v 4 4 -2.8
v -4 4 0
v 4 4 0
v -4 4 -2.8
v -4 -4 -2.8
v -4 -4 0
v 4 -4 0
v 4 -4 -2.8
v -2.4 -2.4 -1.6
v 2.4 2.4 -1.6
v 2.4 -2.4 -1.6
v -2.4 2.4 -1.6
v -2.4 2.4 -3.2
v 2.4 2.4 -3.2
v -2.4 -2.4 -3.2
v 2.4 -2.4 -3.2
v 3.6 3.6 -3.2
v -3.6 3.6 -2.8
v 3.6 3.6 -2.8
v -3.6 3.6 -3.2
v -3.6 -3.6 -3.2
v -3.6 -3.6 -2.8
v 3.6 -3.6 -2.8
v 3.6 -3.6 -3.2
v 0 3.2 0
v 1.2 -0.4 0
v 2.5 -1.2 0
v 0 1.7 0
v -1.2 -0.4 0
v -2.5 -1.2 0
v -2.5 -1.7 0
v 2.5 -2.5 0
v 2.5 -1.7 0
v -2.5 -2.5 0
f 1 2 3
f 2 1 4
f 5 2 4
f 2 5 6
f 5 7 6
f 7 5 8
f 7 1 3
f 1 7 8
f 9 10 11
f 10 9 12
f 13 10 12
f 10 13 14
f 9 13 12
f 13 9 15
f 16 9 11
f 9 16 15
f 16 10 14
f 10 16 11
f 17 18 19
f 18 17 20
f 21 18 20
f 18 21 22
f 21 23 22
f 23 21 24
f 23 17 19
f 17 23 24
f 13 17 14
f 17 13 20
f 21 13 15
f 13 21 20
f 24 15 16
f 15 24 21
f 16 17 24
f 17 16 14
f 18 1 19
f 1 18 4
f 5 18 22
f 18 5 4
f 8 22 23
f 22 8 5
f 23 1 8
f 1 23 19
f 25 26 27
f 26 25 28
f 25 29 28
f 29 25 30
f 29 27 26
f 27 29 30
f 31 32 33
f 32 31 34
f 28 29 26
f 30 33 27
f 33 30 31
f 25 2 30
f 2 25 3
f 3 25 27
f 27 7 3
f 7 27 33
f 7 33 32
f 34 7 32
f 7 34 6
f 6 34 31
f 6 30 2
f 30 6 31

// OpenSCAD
// file: ../p/box5.scad
use <../lib.scad>
function ldraw_lib__box5() = [
// 0 Box with 5 Faces and All Edges
// 0 Name: box5.dat
// 0 Author: James Jessiman
// 0 !LDRAW_ORG Primitive UPDATE 2012-01
// 0 !LICENSE Licensed under CC BY 4.0 : see CAreadme.txt
// 
// 0 BFC CERTIFY CCW
  [0,"BFC","CERTIFY"],
  [0,"BFC","CCW"],
// 
// 0 !HISTORY 2002-04-03 [sbliss] Modified for BFC compliance
// 0 !HISTORY 2002-04-25 [PTadmin] Official Update 2002-02
// 0 !HISTORY 2007-06-24 [PTadmin] Header formatted for Contributor Agreement
// 0 !HISTORY 2008-07-01 [PTadmin] Official Update 2008-01
// 0 !HISTORY 2012-02-16 [Philo] Changed to CCW
// 0 !HISTORY 2012-03-30 [PTadmin] Official Update 2012-01
// 
// 
// 2 24 1 1 1 -1 1 1
  [2,24,1,1,1,-1,1,1],
// 2 24 -1 1 1 -1 1 -1
  [2,24,-1,1,1,-1,1,-1],
// 2 24 -1 1 -1 1 1 -1
  [2,24,-1,1,-1,1,1,-1],
// 2 24 1 1 -1 1 1 1
  [2,24,1,1,-1,1,1,1],
// 2 24 1 0 1 -1 0 1
  [2,24,1,0,1,-1,0,1],
// 2 24 -1 0 1 -1 0 -1
  [2,24,-1,0,1,-1,0,-1],
// 2 24 -1 0 -1 1 0 -1
  [2,24,-1,0,-1,1,0,-1],
// 2 24 1 0 -1 1 0 1
  [2,24,1,0,-1,1,0,1],
// 2 24 1 0 1 1 1 1
  [2,24,1,0,1,1,1,1],
// 2 24 -1 0 1 -1 1 1
  [2,24,-1,0,1,-1,1,1],
// 2 24 1 0 -1 1 1 -1
  [2,24,1,0,-1,1,1,-1],
// 2 24 -1 0 -1 -1 1 -1
  [2,24,-1,0,-1,-1,1,-1],
// 4 16 -1 1 1 1 1 1 1 1 -1 -1 1 -1
  [4,16,-1,1,1,1,1,1,1,1,-1,-1,1,-1],
// 4 16 -1 1 1 -1 0 1 1 0 1 1 1 1
  [4,16,-1,1,1,-1,0,1,1,0,1,1,1,1],
// 4 16 -1 1 -1 -1 0 -1 -1 0 1 -1 1 1
  [4,16,-1,1,-1,-1,0,-1,-1,0,1,-1,1,1],
// 4 16 1 1 -1 1 0 -1 -1 0 -1 -1 1 -1
  [4,16,1,1,-1,1,0,-1,-1,0,-1,-1,1,-1],
// 4 16 1 1 1 1 0 1 1 0 -1 1 1 -1
  [4,16,1,1,1,1,0,1,1,0,-1,1,1,-1],
];
module ldraw_lib__box5(step=0, col=false, unit=2/5, alt=false, line=0.2, solid=!$preview)
    makepoly(ldraw_lib__box5(), step=step, col=col, unit=unit, alt=alt, line=line, solid=solid);
ldraw_lib__box5(line=0.2);
// file: ../p/box4.scad
use <../lib.scad>
function ldraw_lib__box4() = [
// 0 Box with 4 Faces (2 Parallel Pairs) and All Edges
// 0 Name: box4.dat
// 0 Author: James Jessiman
// 0 !LDRAW_ORG Primitive UPDATE 2012-01
// 0 !LICENSE Licensed under CC BY 4.0 : see CAreadme.txt
// 
// 0 BFC CERTIFY CCW
  [0,"BFC","CERTIFY"],
  [0,"BFC","CCW"],
// 
// 0 !HISTORY 2002-04-03 [sbliss] Modified for BFC compliance
// 0 !HISTORY 2002-04-25 [PTadmin] Official Update 2002-02
// 0 !HISTORY 2007-06-24 [PTadmin] Header formatted for Contributor Agreement
// 0 !HISTORY 2008-07-01 [PTadmin] Official Update 2008-01
// 0 !HISTORY 2012-02-16 [Philo] Changed to CCW
// 0 !HISTORY 2012-03-30 [PTadmin] Official Update 2012-01
// 
// 
// 2 24 1 1 1 -1 1 1
  [2,24,1,1,1,-1,1,1],
// 2 24 -1 1 1 -1 1 -1
  [2,24,-1,1,1,-1,1,-1],
// 2 24 -1 1 -1 1 1 -1
  [2,24,-1,1,-1,1,1,-1],
// 2 24 1 1 -1 1 1 1
  [2,24,1,1,-1,1,1,1],
// 2 24 1 0 1 -1 0 1
  [2,24,1,0,1,-1,0,1],
// 2 24 -1 0 1 -1 0 -1
  [2,24,-1,0,1,-1,0,-1],
// 2 24 -1 0 -1 1 0 -1
  [2,24,-1,0,-1,1,0,-1],
// 2 24 1 0 -1 1 0 1
  [2,24,1,0,-1,1,0,1],
// 2 24 1 0 1 1 1 1
  [2,24,1,0,1,1,1,1],
// 2 24 -1 0 1 -1 1 1
  [2,24,-1,0,1,-1,1,1],
// 2 24 1 0 -1 1 1 -1
  [2,24,1,0,-1,1,1,-1],
// 2 24 -1 0 -1 -1 1 -1
  [2,24,-1,0,-1,-1,1,-1],
// 4 16 -1 1 1 -1 0 1 1 0 1 1 1 1
  [4,16,-1,1,1,-1,0,1,1,0,1,1,1,1],
// 4 16 -1 1 -1 -1 0 -1 -1 0 1 -1 1 1
  [4,16,-1,1,-1,-1,0,-1,-1,0,1,-1,1,1],
// 4 16 1 1 -1 1 0 -1 -1 0 -1 -1 1 -1
  [4,16,1,1,-1,1,0,-1,-1,0,-1,-1,1,-1],
// 4 16 1 1 1 1 0 1 1 0 -1 1 1 -1
  [4,16,1,1,1,1,0,1,1,0,-1,1,1,-1],
];
module ldraw_lib__box4(step=0, col=false, unit=2/5, alt=false, line=0.2, solid=!$preview)
    makepoly(ldraw_lib__box4(), step=step, col=col, unit=unit, alt=alt, line=line, solid=solid);
ldraw_lib__box4(line=0.2);
// file: s/3070bs01.scad
use <../../lib.scad>
use <../../p/box4.scad>
use <../../p/box5.scad>
function ldraw_lib__s__3070bs01() = [
// 0 ~Tile  1 x  1 with Groove without Top Face
// 0 Name: s\3070bs01.dat
// 0 Author: Chris Dee [cwdee]
// 0 !LDRAW_ORG Subpart UPDATE 2009-02
// 0 !LICENSE Licensed under CC BY 4.0 : see CAreadme.txt
// 
// 0 BFC CERTIFY CCW
  [0,"BFC","CERTIFY"],
  [0,"BFC","CCW"],
// 
// 0 !HISTORY 2009-09-03 [PTadmin] Official Update 2009-02
// 
// 
// 1 16 0 0 0 10 0 0 0 7 0 0 0 10 box4.dat
  [1,16,0,0,0,10,0,0,0,7,0,0,0,10, ldraw_lib__box4()],
// 0 BFC INVERTNEXT
  [0,"BFC","INVERTNEXT"],
// 1 16 0 8 0 6 0 0 0 -4 0 0 0 6 box5.dat
  [1,16,0,8,0,6,0,0,0,-4,0,0,0,6, ldraw_lib__box5()],
// 1 16 0 7 0 9 0 0 0 1 0 0 0 9 box4.dat
  [1,16,0,7,0,9,0,0,0,1,0,0,0,9, ldraw_lib__box4()],
// 
// 4 16 9 8 9 6 8 6 -6 8 6 -9 8 9
  [4,16,9,8,9,6,8,6,-6,8,6,-9,8,9],
// 4 16 -9 8 9 -6 8 6 -6 8 -6 -9 8 -9
  [4,16,-9,8,9,-6,8,6,-6,8,-6,-9,8,-9],
// 4 16 -9 8 -9 -6 8 -6 6 8 -6 9 8 -9
  [4,16,-9,8,-9,-6,8,-6,6,8,-6,9,8,-9],
// 4 16 9 8 -9 6 8 -6 6 8 6 9 8 9
  [4,16,9,8,-9,6,8,-6,6,8,6,9,8,9],
// 
// 4 16 10 7 10 9 7 9 -9 7 9 -10 7 10
  [4,16,10,7,10,9,7,9,-9,7,9,-10,7,10],
// 4 16 -10 7 10 -9 7 9 -9 7 -9 -10 7 -10
  [4,16,-10,7,10,-9,7,9,-9,7,-9,-10,7,-10],
// 4 16 -10 7 -10 -9 7 -9 9 7 -9 10 7 -10
  [4,16,-10,7,-10,-9,7,-9,9,7,-9,10,7,-10],
// 4 16 10 7 -10 9 7 -9 9 7 9 10 7 10
  [4,16,10,7,-10,9,7,-9,9,7,9,10,7,10],
// 0
];
module ldraw_lib__s__3070bs01(step=0, col=false, unit=2/5, alt=false, line=0.2, solid=!$preview)
    makepoly(ldraw_lib__s__3070bs01(), step=step, col=col, unit=unit, alt=alt, line=line, solid=solid);
ldraw_lib__s__3070bs01(line=0.2);
// main file
use <../lib.scad>
use <s/3070bs01.scad>
function ldraw_lib__3070bp1e() = [
// 0 Tile  1 x  1 with Bright Light Yellow Triangle and Line Pattern
// 0 Name: 3070bp1e.dat
// 0 Author: Vincent Messenet [Cheenzo]
// 0 !LDRAW_ORG Part UPDATE 2023-03
// 0 !LICENSE Licensed under CC BY 4.0 : see CAreadme.txt
// 
// 0 BFC CERTIFY CCW
  [0,"BFC","CERTIFY"],
  [0,"BFC","CCW"],
// 
// 0 !KEYWORDS Bricklink 3070bpb267, BrickOwl 202623, Rebrickable 3070bpr9910
// 0 !KEYWORDS Set 71037
// 
// 0 !HISTORY 2023-06-24 [OrionP] Official Update 2023-03
// 
// 
// 1 16 0 0 0 1 0 0 0 1 0 0 0 1 s\3070bs01.dat
  [1,16,0,0,0,1,0,0,0,1,0,0,0,1, ldraw_lib__s__3070bs01()],
// 
// 4 226 0 0 4.25 3 0 -1 6.25 0 -3 0 0 8
  [4,226,0,0,4.25,3,0,-1,6.25,0,-3,0,0,8],
// 4 226 -6.25 0 -3 -3 0 -1 0 0 4.25 0 0 8
  [4,226,-6.25,0,-3,-3,0,-1,0,0,4.25,0,0,8],
// 4 226 3 0 -1 -3 0 -1 -6.25 0 -3 6.25 0 -3
  [4,226,3,0,-1,-3,0,-1,-6.25,0,-3,6.25,0,-3],
// 4 226 -6.25 0 -4.25 -6.25 0 -6.25 6.25 0 -6.25 6.25 0 -4.25
  [4,226,-6.25,0,-4.25,-6.25,0,-6.25,6.25,0,-6.25,6.25,0,-4.25],
// 3 16 0 0 4.25 -3 0 -1 3 0 -1
  [3,16,0,0,4.25,-3,0,-1,3,0,-1],
// 4 16 -6.25 0 -3 -6.25 0 -4.25 6.25 0 -4.25 6.25 0 -3
  [4,16,-6.25,0,-3,-6.25,0,-4.25,6.25,0,-4.25,6.25,0,-3],
// 3 16 0 0 8 -10 0 10 -6.25 0 -3
  [3,16,0,0,8,-10,0,10,-6.25,0,-3],
// 3 16 -10 0 10 0 0 8 10 0 10
  [3,16,-10,0,10,0,0,8,10,0,10],
// 3 16 10 0 10 0 0 8 6.25 0 -3
  [3,16,10,0,10,0,0,8,6.25,0,-3],
// 4 16 10 0 10 6.25 0 -3 6.25 0 -4.25 10 0 -10
  [4,16,10,0,10,6.25,0,-3,6.25,0,-4.25,10,0,-10],
// 3 16 10 0 -10 6.25 0 -4.25 6.25 0 -6.25
  [3,16,10,0,-10,6.25,0,-4.25,6.25,0,-6.25],
// 4 16 10 0 -10 6.25 0 -6.25 -6.25 0 -6.25 -10 0 -10
  [4,16,10,0,-10,6.25,0,-6.25,-6.25,0,-6.25,-10,0,-10],
// 3 16 -10 0 -10 -6.25 0 -6.25 -6.25 0 -4.25
  [3,16,-10,0,-10,-6.25,0,-6.25,-6.25,0,-4.25],
// 4 16 -10 0 -10 -6.25 0 -4.25 -6.25 0 -3 -10 0 10
  [4,16,-10,0,-10,-6.25,0,-4.25,-6.25,0,-3,-10,0,10],
];
module ldraw_lib__3070bp1e(step=0, col=false, unit=2/5, alt=false, line=0.2, solid=!$preview)
    makepoly(ldraw_lib__3070bp1e(), step=step, col=col, unit=unit, alt=alt, line=line, solid=solid);
ldraw_lib__3070bp1e(line=0.2);
